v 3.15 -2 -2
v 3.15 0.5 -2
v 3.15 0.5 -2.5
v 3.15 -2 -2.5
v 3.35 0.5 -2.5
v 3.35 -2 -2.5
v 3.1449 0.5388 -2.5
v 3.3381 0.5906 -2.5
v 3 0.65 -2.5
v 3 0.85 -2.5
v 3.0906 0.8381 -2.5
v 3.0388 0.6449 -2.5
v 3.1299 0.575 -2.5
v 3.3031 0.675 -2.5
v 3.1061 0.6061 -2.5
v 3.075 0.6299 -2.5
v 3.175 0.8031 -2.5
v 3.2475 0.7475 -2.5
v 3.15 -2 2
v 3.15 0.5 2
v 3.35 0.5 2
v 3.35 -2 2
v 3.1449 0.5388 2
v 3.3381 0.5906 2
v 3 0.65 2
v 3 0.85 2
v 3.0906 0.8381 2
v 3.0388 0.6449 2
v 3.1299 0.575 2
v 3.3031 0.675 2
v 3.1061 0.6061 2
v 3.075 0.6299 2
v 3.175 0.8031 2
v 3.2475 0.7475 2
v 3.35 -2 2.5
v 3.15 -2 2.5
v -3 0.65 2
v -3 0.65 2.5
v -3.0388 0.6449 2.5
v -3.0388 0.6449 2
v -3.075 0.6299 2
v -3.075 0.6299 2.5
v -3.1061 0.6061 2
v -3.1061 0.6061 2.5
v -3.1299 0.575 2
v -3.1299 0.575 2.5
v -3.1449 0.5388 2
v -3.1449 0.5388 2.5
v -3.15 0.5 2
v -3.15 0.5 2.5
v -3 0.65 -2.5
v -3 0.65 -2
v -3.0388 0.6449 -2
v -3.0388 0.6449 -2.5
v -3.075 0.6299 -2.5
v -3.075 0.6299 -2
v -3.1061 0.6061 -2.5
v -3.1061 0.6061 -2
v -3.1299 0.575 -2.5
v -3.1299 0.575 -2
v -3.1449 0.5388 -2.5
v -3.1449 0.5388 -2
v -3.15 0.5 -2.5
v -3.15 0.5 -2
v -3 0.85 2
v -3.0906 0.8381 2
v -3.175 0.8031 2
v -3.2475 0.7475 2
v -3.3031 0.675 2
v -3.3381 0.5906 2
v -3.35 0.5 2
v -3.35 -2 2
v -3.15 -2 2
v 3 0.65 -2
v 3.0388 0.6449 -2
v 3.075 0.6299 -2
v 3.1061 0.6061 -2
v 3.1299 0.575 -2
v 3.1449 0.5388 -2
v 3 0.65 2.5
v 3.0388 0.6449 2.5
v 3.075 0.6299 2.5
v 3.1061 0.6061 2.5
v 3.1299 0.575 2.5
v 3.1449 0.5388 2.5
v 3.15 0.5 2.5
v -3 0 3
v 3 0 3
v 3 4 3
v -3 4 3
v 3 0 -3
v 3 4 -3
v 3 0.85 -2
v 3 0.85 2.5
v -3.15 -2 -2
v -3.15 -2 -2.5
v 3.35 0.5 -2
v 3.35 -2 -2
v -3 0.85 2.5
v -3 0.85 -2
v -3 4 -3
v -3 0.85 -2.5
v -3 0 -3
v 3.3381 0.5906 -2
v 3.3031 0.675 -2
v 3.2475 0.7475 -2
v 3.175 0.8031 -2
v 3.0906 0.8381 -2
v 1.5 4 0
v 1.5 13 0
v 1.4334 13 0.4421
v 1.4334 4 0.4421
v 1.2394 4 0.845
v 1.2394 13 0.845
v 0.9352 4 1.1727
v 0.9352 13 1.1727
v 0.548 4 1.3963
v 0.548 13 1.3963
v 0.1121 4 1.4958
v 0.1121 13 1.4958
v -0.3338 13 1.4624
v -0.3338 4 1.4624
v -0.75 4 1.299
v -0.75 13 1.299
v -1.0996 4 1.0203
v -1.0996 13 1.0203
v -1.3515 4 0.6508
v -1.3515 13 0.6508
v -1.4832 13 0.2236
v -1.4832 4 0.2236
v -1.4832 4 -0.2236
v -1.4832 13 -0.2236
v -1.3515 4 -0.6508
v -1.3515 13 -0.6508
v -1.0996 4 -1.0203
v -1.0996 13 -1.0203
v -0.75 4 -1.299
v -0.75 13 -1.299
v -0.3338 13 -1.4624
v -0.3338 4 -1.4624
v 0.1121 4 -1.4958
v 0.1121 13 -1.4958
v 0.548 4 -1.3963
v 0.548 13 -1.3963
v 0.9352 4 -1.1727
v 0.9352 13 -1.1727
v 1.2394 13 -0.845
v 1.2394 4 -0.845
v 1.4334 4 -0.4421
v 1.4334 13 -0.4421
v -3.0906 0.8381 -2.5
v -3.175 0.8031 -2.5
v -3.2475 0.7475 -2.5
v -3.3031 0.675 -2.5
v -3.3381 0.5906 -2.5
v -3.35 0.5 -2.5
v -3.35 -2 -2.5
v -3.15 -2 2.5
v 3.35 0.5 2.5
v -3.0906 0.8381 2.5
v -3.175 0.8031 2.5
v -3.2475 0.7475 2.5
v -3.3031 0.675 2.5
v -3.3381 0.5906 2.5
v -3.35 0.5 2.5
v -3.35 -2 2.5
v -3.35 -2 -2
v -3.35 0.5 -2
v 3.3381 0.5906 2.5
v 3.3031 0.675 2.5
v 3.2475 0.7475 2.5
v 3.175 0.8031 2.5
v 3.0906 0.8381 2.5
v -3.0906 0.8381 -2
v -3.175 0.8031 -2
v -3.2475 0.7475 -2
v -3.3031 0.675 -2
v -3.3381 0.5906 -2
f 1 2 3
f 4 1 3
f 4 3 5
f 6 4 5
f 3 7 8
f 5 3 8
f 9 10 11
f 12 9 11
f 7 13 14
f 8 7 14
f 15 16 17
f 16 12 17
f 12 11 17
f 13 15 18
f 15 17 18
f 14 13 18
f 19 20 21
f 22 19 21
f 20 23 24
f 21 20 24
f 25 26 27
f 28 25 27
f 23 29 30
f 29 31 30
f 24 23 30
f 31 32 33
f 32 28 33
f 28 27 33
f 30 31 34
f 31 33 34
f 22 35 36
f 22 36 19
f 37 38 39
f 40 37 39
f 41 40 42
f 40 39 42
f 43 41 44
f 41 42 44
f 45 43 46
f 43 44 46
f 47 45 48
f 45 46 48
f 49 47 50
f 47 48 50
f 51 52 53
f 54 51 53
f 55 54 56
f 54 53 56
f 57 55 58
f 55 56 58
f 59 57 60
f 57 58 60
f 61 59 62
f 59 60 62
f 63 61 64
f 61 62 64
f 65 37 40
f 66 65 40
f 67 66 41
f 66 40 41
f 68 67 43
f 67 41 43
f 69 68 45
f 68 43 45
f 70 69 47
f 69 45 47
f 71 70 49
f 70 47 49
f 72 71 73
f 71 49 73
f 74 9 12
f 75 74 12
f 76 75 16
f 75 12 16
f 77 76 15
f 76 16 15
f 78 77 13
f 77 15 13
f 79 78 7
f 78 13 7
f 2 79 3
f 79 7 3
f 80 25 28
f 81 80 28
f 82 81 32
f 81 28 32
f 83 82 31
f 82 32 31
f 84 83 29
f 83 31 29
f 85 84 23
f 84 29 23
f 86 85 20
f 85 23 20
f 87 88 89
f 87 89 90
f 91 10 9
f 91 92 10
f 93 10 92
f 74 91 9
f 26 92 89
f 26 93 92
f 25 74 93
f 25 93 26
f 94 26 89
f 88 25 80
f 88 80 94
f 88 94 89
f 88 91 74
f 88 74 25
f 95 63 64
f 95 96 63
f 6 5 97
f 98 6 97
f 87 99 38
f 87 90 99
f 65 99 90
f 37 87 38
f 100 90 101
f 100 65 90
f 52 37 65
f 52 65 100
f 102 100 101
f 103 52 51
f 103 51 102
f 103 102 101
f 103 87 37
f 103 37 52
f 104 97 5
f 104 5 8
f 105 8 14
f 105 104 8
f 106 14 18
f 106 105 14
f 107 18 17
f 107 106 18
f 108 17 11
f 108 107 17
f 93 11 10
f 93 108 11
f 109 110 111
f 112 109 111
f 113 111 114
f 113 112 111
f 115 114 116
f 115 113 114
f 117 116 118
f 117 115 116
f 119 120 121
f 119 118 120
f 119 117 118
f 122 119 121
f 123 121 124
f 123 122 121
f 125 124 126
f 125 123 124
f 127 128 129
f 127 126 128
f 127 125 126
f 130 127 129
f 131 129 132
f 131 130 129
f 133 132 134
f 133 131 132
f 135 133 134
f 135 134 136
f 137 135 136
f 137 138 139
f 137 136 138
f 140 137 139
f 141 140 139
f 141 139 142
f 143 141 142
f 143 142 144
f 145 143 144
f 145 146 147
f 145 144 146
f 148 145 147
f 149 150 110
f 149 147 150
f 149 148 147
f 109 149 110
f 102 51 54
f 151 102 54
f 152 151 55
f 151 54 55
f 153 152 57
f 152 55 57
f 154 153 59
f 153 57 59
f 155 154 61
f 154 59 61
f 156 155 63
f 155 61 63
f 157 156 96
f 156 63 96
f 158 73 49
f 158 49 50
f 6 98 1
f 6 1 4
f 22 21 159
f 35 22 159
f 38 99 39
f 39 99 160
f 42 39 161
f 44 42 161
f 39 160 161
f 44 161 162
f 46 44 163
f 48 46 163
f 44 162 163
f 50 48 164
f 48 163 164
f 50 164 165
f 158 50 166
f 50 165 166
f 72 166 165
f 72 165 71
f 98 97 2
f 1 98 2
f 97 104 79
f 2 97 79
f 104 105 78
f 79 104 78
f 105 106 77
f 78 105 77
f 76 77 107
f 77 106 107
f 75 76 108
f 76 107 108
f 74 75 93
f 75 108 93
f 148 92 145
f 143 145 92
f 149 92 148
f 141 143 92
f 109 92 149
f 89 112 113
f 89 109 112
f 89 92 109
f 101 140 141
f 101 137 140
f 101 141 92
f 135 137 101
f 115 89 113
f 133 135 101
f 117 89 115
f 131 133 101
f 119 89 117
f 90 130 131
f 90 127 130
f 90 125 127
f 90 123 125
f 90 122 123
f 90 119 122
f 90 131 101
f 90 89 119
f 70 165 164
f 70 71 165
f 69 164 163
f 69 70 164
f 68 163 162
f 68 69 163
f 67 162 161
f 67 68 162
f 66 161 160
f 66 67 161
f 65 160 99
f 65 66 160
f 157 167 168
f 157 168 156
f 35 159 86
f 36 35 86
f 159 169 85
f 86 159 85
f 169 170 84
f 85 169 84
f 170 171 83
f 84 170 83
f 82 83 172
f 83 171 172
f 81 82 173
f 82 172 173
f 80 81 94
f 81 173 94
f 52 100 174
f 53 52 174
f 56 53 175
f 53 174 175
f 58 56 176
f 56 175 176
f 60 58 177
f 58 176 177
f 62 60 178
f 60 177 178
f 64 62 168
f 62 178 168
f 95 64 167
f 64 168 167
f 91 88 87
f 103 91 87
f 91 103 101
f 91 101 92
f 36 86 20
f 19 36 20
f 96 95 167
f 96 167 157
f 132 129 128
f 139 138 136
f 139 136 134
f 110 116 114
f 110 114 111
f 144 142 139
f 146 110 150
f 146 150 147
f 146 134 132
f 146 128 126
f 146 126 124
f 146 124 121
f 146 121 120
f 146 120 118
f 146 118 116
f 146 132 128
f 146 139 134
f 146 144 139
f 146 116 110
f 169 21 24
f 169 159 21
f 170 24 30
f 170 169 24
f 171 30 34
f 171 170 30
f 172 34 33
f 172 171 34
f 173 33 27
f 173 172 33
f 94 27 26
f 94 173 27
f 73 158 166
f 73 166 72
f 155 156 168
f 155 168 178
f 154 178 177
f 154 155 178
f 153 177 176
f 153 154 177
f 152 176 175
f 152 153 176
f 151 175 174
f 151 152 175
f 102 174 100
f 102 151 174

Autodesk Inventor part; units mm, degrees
ref_plane "YZ Plane" through (0, 0, 0) normal (1, 0, 0) x (0, 1, 0)
ref_plane "XZ Plane" through (0, 0, 0) normal (0, 1, 0) x (-1, 0, 0)
sketch "Эскиз1" plane through (0, 0, 0) normal (0, 1, 0) x (-1, 0, 0)
  line L0 (3, -3) -> (-3, -3)
  line L1 (-3, -3) -> (-3, 3)
  line L2 (-3, 3) -> (3, 3)
  line L3 (3, 3) -> (3, -3)
  line L4 (4.2, 0) -> (-4.2, 0) projected
  line L5 (0, -4.2) -> (0, 4.2) projected
  point P0 (0, 0)
  dimension "d0" = 6
  dimension "d1" = 6
extrude "Выдавливание1" add sketch "Эскиз1" along normal blind 4
sketch "Эскиз2" plane through (0, 4, 0) normal (0, 1, 0) x (1, 0, 0)
  circle A0 centre (0, 0) radius 1.5
  dimension "d4" = 3
ref_plane "РабПлоскость1" through (0, 13, 0) normal (0, 1, 0) x (1, 0, 0)
sketch "Эскиз3" plane through (0, 13, 0) normal (0, 1, 0) x (1, 0, 0)
  circle A0 centre (0, 0) radius 1.5
  dimension "d6" = 3
loft "Лофт1" add profiles "Эскиз3", "Эскиз2"
sketch "Эскиз4" plane through (0, 0, 0) normal (0, 0, 1) x (1, 0, 0)
  line L0 (3, 0) -> (-3, 0) projected
  line L1 (3, 0) -> (3, 4) projected
  line L2 (-3, 4) -> (3, 4) projected
  line L3 (-3, 0) -> (-3, 4) projected
  arc A0 (3.25, 0.5) -> (3, 0.75) centre (3, 0.5) ccw
  line L4 (3.25, 0.5) -> (3.25, -2)
  line L5 (0, -5) -> (0, 16) projected
  arc A1 (-3, 0.75) -> (-3.25, 0.5) centre (-3, 0.5) ccw
  line L6 (-3.25, 0.5) -> (-3.25, -2)
  point P0 (0, 0)
  dimension "d11" = 0.5
  dimension "d12" = 0.5
  dimension "d13" = 2
sketch "Эскиз5" plane through (3, 0, 3) normal (1, 0, 0) x (0, 0, -1)
  line L0 (3.7546, 0.75) -> (2.4212, 0.75)
  line L1 (0.5, 0.85) -> (1, 0.85)
  line L2 (1, 0.85) -> (1, 0.65)
  line L3 (1, 0.65) -> (0.5, 0.65)
  line L4 (0.5, 0.65) -> (0.5, 0.85)
  line L5 (3, -5) -> (3, 16) projected
  line L6 (5.5, 0.85) -> (5, 0.85)
  line L7 (5, 0.85) -> (5, 0.65)
  line L8 (5, 0.65) -> (5.5, 0.65)
  line L9 (5.5, 0.65) -> (5.5, 0.85)
  line L10 (3, 0.75) -> (3, 0.5) projected
  point P0 (3, 0)
  dimension "d14" = 0.5
  dimension "d15" = 0.2
  dimension "d16" = 2
sketch "Эскиз6" plane through (-3, 0, -3) normal (-1, 0, 0) x (0, 0, 1)
  line L0 (5.5, 0.85) -> (5, 0.85) projected
  line L1 (5.5, 0.65) -> (5.5, 0.85) projected
  line L2 (5, 0.65) -> (5.5, 0.65) projected
  line L3 (5, 0.85) -> (5, 0.65) projected
  line L4 (0, 0) -> (6, 0) projected
  line L5 (0, 0) -> (0, 4) projected
  line L6 (6, 4) -> (0, 4) projected
  line L7 (6, 0) -> (6, 4) projected
  line L8 (0.5, 0.85) -> (1, 0.85) projected
  line L9 (1, 0.85) -> (1, 0.65) projected
  line L10 (1, 0.65) -> (0.5, 0.65) projected
  line L11 (0.5, 0.65) -> (0.5, 0.85) projected
  point P0 (3, 0)
sweep "Сдвиг1" add profiles "Эскиз5" path "Эскиз4" path curves A0 L4
sweep "Сдвиг2" add profiles "Эскиз6" path "Эскиз4" path curves A1 L6 contours L1 L2 L3 L0 | L8 L9 L10 L11
sketch "Эскиз7" plane through (0, 0, 0) normal (0, -1, 0) x (1, 0, 0)
  line L0 (-3.35, -2) -> (-3.35, -2.5) projected
  line L1 (-3.35, -2.5) -> (-3.15, -2.5) projected
  line L2 (-3.15, -2.5) -> (-3.15, -2) projected
  line L3 (-3.15, -2) -> (-3.35, -2) projected
  circle A0 centre (-3.25, -2.25) radius 0.2693
  point P0 (0, 0)
equation "\"d1\" = d0"
properties part number "button"
